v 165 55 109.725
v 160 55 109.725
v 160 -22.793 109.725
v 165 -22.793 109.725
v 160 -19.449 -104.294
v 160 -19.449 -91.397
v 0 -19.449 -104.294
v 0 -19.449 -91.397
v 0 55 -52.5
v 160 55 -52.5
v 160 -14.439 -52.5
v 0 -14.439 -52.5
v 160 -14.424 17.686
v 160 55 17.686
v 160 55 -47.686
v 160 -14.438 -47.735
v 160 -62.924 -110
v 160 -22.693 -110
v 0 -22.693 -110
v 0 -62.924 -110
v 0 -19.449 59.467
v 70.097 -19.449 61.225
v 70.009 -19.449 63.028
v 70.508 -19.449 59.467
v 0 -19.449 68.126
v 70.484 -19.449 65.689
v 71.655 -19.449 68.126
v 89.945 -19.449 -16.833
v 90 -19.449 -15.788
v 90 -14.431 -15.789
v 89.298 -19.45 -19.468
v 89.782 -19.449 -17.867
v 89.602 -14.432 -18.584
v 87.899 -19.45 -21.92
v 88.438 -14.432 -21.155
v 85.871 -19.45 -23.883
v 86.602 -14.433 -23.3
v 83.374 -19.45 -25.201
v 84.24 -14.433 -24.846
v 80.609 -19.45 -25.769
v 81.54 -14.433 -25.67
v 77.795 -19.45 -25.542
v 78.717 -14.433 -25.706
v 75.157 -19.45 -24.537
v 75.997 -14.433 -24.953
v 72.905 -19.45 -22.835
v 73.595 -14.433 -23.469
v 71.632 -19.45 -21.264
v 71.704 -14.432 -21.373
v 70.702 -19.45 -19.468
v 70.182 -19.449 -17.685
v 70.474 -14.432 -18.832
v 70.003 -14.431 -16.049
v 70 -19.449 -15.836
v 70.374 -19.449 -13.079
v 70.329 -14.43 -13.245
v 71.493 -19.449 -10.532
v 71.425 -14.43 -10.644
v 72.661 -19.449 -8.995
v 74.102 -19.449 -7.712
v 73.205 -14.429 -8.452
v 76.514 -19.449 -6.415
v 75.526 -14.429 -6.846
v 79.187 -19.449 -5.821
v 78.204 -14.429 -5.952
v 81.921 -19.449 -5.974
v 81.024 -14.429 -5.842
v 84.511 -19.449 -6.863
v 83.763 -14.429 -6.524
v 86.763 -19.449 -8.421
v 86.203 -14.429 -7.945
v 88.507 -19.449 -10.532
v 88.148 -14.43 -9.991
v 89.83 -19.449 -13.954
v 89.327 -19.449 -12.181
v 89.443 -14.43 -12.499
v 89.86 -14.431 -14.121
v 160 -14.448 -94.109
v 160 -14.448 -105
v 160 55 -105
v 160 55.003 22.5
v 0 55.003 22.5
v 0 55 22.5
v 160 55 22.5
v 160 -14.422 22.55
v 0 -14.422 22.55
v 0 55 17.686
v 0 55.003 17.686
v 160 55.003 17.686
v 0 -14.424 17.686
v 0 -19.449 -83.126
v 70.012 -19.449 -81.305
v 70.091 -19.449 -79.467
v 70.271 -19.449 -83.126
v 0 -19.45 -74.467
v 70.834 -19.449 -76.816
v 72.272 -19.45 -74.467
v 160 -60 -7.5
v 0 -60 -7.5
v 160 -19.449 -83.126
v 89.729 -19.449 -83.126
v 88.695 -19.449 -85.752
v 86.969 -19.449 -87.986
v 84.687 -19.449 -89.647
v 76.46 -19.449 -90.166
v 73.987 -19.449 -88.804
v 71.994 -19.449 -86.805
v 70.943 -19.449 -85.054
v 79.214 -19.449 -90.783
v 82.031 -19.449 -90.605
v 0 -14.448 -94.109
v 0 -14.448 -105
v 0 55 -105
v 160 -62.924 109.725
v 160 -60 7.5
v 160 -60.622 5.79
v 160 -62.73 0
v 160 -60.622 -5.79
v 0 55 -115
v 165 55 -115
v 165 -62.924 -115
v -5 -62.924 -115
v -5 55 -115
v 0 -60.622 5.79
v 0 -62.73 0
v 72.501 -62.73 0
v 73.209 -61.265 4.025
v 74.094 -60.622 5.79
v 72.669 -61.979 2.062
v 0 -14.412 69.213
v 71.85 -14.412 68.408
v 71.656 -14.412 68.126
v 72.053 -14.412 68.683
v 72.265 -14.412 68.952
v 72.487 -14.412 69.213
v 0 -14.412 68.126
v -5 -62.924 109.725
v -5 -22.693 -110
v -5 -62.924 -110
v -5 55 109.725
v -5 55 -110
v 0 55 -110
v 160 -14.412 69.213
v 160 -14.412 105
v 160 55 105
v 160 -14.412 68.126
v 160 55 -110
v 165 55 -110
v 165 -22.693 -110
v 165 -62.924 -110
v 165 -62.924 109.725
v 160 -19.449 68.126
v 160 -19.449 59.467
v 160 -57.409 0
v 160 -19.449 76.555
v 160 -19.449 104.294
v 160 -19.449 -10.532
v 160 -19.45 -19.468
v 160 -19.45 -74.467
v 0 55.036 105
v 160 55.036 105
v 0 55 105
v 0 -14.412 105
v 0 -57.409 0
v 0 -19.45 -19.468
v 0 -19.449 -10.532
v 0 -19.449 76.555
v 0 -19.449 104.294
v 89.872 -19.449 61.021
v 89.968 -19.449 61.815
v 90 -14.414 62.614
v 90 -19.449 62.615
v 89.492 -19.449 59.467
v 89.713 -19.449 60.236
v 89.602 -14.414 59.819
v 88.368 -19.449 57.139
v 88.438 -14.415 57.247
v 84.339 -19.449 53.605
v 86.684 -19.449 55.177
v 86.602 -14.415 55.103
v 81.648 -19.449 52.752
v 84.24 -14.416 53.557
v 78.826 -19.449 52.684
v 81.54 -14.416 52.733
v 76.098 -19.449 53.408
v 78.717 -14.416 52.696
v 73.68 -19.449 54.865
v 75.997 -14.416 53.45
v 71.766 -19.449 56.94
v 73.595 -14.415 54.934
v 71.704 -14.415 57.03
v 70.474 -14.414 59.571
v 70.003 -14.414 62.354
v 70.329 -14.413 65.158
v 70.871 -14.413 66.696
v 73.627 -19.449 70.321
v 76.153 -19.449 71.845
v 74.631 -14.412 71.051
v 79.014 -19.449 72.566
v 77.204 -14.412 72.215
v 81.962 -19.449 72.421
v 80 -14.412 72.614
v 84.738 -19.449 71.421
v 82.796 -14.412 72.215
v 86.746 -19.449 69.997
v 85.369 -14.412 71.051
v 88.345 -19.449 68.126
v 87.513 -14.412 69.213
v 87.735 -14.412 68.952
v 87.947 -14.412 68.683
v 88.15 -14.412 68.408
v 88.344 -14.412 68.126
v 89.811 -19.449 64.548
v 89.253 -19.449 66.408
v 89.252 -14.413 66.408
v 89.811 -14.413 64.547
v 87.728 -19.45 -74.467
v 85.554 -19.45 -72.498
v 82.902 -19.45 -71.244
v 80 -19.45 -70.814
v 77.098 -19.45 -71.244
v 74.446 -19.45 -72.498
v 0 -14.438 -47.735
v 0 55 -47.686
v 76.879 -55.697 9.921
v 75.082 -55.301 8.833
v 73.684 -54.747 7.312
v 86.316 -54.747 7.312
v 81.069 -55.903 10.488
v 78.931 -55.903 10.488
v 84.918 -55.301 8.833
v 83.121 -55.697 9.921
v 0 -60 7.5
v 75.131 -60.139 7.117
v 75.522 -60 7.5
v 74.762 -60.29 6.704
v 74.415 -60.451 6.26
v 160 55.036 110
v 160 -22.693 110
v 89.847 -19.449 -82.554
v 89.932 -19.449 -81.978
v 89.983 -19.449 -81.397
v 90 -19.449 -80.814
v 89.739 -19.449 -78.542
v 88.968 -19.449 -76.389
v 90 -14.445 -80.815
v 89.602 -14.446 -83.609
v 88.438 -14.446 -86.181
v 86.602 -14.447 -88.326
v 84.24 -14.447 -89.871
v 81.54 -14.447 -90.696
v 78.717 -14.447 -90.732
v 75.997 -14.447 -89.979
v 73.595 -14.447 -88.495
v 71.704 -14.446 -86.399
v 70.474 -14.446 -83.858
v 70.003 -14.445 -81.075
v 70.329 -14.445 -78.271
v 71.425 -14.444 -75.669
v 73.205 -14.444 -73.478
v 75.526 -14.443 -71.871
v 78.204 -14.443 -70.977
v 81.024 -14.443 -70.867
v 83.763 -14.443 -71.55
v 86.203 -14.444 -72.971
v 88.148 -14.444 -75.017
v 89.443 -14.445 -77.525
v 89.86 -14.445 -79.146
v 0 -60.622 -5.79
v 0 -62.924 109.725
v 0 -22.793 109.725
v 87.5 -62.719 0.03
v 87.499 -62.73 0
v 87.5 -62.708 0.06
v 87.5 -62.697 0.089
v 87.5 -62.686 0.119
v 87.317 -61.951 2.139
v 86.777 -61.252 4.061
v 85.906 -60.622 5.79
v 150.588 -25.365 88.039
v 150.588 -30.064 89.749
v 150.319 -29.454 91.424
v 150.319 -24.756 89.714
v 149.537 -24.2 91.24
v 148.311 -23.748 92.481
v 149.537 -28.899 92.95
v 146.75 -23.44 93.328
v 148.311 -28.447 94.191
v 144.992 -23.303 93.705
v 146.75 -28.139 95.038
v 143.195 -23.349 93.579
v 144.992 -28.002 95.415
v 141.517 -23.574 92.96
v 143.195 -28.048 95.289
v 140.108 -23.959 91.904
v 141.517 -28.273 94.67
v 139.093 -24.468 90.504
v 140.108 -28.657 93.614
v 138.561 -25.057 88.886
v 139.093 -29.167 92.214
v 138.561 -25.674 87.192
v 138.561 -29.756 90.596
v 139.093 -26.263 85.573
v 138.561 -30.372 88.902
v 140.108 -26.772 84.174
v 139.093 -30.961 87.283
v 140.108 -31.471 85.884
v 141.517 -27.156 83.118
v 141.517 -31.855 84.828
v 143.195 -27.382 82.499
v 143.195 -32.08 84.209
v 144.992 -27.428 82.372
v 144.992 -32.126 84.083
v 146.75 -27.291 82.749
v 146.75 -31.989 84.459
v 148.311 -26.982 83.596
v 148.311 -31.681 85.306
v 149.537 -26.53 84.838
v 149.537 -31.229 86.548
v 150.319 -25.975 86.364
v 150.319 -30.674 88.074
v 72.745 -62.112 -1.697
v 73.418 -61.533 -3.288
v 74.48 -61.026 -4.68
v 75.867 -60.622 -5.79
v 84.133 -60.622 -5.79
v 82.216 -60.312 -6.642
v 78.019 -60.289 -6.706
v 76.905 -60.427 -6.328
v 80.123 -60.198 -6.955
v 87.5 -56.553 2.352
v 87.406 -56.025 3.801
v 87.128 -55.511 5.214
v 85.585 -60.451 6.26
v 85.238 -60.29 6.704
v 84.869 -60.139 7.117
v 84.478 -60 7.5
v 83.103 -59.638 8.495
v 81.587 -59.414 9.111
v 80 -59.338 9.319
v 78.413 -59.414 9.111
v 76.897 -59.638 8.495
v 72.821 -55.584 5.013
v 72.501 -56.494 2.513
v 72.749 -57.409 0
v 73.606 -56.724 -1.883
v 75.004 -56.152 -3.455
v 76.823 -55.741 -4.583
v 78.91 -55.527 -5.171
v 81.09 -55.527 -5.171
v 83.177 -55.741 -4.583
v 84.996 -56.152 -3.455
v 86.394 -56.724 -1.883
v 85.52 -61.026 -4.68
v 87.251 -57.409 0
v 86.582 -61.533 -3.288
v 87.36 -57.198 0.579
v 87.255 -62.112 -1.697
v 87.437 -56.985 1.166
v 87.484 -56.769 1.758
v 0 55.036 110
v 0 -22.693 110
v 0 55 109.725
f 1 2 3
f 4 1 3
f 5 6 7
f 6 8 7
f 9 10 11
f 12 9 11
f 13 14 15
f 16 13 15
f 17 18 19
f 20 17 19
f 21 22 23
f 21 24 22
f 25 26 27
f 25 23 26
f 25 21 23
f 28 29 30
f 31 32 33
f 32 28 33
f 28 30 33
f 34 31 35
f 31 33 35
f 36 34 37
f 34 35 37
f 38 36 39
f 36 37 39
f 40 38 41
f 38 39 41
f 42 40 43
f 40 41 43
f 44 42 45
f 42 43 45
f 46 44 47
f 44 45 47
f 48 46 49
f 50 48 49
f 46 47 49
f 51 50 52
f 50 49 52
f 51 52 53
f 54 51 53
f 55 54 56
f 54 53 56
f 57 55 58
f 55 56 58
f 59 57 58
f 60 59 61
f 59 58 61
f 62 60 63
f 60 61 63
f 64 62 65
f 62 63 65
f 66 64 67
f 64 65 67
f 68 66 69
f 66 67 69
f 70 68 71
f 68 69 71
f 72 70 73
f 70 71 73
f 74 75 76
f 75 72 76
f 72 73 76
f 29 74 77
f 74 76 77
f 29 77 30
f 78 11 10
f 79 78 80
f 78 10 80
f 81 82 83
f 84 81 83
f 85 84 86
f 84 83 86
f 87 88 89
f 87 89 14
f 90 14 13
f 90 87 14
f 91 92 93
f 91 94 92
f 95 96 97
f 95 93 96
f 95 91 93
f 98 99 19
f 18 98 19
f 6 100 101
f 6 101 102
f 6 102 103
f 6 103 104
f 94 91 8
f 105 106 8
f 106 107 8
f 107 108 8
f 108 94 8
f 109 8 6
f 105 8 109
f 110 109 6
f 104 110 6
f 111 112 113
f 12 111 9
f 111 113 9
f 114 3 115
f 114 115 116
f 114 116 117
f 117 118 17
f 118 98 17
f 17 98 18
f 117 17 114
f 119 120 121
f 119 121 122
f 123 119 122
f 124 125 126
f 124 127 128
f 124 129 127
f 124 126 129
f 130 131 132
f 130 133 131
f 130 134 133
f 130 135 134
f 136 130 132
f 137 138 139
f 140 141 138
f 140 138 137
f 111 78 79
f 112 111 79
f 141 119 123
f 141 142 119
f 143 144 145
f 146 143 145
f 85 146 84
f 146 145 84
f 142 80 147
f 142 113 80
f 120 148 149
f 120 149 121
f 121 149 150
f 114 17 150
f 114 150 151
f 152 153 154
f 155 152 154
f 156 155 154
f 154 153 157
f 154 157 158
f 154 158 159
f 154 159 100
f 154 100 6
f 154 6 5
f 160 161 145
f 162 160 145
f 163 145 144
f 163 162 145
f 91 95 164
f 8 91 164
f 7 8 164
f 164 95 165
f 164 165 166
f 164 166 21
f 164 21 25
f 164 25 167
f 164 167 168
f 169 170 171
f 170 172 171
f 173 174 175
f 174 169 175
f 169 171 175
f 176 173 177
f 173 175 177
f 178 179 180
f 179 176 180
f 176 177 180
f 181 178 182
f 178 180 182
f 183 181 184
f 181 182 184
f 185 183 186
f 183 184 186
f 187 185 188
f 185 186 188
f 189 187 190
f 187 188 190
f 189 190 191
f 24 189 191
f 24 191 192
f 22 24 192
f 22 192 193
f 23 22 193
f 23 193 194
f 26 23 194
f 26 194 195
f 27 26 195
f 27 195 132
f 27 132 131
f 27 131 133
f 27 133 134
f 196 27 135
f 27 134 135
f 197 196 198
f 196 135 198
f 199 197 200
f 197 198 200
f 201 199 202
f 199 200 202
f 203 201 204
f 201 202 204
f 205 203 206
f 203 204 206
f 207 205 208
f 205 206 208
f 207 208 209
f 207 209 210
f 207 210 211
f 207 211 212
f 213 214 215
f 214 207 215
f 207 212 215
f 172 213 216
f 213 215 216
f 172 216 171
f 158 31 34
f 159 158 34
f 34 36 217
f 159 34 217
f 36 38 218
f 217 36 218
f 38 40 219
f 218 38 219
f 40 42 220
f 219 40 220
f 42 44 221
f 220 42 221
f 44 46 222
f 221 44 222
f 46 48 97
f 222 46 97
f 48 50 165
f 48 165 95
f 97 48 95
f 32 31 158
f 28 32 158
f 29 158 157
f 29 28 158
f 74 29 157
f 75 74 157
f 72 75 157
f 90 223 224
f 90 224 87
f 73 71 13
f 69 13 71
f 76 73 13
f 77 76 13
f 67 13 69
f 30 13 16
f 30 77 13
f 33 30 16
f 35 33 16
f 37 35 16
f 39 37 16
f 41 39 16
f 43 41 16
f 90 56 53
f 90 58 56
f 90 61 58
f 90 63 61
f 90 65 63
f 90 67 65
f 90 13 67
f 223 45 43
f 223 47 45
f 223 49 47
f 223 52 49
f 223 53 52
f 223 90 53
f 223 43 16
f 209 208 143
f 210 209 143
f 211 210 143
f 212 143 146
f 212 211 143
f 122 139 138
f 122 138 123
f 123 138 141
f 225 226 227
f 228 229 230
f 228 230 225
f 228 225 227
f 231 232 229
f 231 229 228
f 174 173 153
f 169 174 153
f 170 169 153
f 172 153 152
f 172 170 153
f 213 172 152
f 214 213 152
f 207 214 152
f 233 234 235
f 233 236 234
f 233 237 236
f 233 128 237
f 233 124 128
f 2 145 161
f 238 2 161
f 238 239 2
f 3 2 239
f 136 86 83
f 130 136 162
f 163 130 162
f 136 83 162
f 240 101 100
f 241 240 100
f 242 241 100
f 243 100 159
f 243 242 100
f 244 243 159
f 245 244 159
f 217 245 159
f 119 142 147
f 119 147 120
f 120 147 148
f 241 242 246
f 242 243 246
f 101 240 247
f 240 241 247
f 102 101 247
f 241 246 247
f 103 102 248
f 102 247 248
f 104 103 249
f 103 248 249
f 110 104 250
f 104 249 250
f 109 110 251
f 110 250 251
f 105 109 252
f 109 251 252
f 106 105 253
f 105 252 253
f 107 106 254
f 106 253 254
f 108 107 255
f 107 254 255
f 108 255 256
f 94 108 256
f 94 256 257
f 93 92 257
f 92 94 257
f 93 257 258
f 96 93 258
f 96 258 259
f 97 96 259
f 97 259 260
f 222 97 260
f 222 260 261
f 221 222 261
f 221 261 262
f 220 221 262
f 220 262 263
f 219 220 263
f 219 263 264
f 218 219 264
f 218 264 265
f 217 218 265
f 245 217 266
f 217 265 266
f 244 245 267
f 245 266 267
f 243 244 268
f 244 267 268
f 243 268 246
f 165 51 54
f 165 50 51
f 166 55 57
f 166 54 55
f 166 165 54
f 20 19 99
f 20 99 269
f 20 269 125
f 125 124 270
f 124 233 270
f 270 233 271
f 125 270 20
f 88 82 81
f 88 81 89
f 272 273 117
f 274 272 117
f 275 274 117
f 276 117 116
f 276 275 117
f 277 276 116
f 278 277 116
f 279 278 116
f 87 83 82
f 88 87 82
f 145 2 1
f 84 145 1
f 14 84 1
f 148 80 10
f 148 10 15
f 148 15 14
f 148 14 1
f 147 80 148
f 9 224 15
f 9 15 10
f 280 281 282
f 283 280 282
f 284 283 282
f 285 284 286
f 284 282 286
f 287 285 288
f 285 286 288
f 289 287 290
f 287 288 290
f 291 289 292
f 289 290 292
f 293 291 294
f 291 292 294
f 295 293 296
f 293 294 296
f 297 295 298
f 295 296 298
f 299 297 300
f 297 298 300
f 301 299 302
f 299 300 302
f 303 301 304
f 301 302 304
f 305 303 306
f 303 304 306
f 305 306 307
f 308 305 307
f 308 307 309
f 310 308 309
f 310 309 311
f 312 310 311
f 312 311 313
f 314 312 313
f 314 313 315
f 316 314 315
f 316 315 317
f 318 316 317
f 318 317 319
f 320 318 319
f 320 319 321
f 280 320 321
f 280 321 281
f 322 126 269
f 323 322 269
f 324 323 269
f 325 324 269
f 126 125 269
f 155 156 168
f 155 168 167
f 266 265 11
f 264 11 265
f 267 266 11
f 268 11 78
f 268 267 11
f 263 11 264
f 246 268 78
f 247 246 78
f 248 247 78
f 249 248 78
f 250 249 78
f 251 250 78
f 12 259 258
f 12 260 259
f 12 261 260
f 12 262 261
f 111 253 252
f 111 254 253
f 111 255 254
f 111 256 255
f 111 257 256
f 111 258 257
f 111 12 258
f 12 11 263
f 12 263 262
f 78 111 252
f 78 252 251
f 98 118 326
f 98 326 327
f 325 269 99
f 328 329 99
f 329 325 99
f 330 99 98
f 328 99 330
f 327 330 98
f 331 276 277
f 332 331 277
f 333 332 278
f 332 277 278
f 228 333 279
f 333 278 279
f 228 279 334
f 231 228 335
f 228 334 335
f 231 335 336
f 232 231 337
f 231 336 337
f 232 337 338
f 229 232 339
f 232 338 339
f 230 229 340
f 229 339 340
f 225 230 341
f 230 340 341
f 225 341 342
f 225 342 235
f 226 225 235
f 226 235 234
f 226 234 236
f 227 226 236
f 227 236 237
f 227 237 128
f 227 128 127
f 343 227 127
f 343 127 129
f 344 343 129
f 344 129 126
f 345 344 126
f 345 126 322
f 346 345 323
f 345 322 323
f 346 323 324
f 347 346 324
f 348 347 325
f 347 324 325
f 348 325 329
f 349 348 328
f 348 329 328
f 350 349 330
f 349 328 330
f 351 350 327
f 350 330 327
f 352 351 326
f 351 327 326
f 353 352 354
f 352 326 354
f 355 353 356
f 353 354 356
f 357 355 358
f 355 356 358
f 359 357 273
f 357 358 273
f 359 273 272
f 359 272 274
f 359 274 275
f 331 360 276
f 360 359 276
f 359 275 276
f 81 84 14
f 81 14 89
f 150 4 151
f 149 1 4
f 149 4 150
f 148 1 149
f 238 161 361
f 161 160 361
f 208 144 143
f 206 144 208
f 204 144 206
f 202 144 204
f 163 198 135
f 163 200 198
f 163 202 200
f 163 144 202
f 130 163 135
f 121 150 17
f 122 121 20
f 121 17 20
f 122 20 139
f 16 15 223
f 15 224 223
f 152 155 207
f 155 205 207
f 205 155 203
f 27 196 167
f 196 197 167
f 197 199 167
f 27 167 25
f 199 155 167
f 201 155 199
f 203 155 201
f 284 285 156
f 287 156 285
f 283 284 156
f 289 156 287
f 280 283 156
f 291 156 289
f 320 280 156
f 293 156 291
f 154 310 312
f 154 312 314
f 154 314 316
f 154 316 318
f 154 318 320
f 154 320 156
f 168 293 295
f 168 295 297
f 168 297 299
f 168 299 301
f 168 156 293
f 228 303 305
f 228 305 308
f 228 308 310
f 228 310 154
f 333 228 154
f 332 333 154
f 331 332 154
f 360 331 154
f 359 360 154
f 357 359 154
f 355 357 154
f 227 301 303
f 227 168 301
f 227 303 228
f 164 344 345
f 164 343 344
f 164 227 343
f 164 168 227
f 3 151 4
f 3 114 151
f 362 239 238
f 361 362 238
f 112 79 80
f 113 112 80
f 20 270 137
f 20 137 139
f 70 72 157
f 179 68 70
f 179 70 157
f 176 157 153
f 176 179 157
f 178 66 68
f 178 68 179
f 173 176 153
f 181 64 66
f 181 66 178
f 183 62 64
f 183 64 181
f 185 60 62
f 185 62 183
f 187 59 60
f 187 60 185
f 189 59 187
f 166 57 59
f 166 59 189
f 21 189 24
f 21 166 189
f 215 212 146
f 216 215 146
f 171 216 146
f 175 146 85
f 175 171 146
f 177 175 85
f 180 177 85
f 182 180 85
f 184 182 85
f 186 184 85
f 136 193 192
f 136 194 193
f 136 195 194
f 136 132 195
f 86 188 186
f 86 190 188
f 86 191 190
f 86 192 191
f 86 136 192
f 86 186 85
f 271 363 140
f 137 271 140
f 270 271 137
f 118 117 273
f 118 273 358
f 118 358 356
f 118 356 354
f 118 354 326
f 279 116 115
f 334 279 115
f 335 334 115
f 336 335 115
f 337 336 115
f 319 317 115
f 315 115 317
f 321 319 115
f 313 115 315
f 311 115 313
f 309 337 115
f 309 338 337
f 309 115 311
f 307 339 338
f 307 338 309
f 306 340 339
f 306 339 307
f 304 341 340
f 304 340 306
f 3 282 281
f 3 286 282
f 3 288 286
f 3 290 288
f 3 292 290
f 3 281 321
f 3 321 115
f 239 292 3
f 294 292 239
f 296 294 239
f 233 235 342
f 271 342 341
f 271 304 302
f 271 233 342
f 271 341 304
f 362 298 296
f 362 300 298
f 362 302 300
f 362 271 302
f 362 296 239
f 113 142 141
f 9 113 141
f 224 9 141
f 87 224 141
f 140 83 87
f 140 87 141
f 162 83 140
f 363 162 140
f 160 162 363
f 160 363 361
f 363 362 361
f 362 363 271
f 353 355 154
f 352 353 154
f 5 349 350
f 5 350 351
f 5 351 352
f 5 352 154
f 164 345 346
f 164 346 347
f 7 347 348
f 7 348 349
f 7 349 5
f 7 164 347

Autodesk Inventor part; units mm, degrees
ref_plane "YZ Plane" through (0, 0, 0) normal (1, 0, 0) x (0, 1, 0)
ref_plane "XZ Plane" through (0, 0, 0) normal (0, 1, 0) x (-1, 0, 0)
ref_plane "XY Plane" through (0, 0, 0) normal (0, 0, 1) x (1, 0, 0)
sketch "Sketch1" plane through (0, 0, 0) normal (1, 0, 0) x (0, 1, 0)
  line L0 (-22.6931, 110) -> (55.0359, 110)
  line L1 (55, -110) -> (-22.6931, -110)
  line L2 (-62.7298, 0) -> (-22.6931, -110)
  line L3 (-62.7298, 0) -> (-22.6931, 110)
  line L4 (-57.4089, 0) -> (-19.449, -104.2938)
  line L5 (-14.4482, -105) -> (55, -105)
  line L6 (55.0359, 105) -> (-14.4122, 105)
  line L7 (-19.449, 104.2938) -> (-57.4089, 0)
  line L8 (55.0034, 17.6855) -> (-14.4593, 17.6855)
  line L9 (55.0034, 22.5) -> (-14.4456, 22.5496)
  line L10 (55, -52.5) -> (-14.449, -52.5)
  line L11 (55, -47.6855) -> (-14.449, -47.7352)
  line L12 (-60.6224, -5.7899) -> (-60, -7.5)
  line L13 (-60.6224, 5.7899) -> (-60, 7.5)
  line L14 (-14.4122, 105) -> (-14.4122, 68.1255)
  line L15 (-14.4456, 59.4672) -> (-14.4456, 22.5496)
  line L16 (-19.449, 104.2938) -> (-19.449, 68.1255)
  line L17 (-14.4593, 17.6855) -> (-14.4593, -10.5317)
  line L18 (-14.449, -19.4683) -> (-14.449, -47.7352)
  line L19 (-19.4705, 59.4672) -> (-19.4705, -10.5317)
  line L20 (-14.449, -52.5) -> (-14.449, -74.4672)
  line L21 (-14.4482, -83.1255) -> (-14.4482, -105.0928)
  line L22 (-19.4499, -19.4683) -> (-19.4499, -74.4672)
  line L23 (-19.449, -83.1255) -> (-19.449, -104.2938)
  line L24 (-19.449, -74.4672) -> (-19.4499, -74.4672)
  line L25 (-14.4593, -83.1255) -> (-14.4482, -83.1255)
  line L26 (-19.4499, -19.4683) -> (-19.449, -19.4683)
  line L27 (-19.4705, -10.5317) -> (-19.449, -10.5317)
  line L28 (-14.4122, 68.1255) -> (-14.4125, 68.1255)
  line L29 (-19.4705, 59.4672) -> (-19.449, 59.4672)
  line L30 (55.0359, 105) -> (55.0359, 110)
  line L31 (55.0034, 22.5) -> (55.0034, 17.6855)
  line L32 (55, -47.6855) -> (55, -52.5)
  line L33 (55, -105) -> (55, -110)
  line L34 (-19.449, -91.3967) -> (-19.449, 76.5553)
  line L35 (-14.4122, 69.213) -> (-14.4225, 22.5496)
  line L36 (-14.4236, 17.6855) -> (-14.438, -47.7351)
  line L37 (-14.439, -52.5) -> (-14.4482, -94.1091)
  point P0 (0, 0)
extrude "Extrusion1" add sketch "Sketch1" along normal blind 160
sketch "Sketch2" plane through (0, -14.4236, 17.6855) normal (0, 1, -0.0002) x (1, 0, 0)
  circle A0 centre (80, 33.4744) radius 10
  circle A1 centre (80, 98.5003) radius 10
  circle A2 centre (80, -44.9284) radius 10
  point P0 (0, 17.6824)
  dimension "d24" = 20
  dimension "d25" = 20
  dimension "d26" = 20
extrude "Extrusion2" cut sketch "Sketch2" against normal blind 6
sketch "Sketch3" plane through (0, -22.6931, -110) normal (0, -0.9397, -0.342) x (1, 0, 0)
  point P0 (0, 95.6047)
sketch "Sketch4" plane through (0, -22.6931, -110) normal (0, -0.9397, -0.342) x (1, 0, 0)
  line L0 (0, 117.1568) -> (160, 117.1568) projected
  circle A0 centre (80, 117.1568) radius 7.5
  point P0 (0, 95.6047)
  dimension "d29" = 15
extrude "Extrusion3" cut sketch "Sketch4" against normal blind 10
sketch "Sketch5" plane through (0, 0, 0) normal (-1, 0, 0) x (0, 0, 1)
  line L0 (-110, -22.6931) -> (-110, 55) projected
  line L1 (-110, 55) -> (109.7253, 55)
  line L2 (109.7253, 55) -> (109.7253, -62.9244)
  line L3 (109.7253, -62.9244) -> (-110, -62.9244)
  line L4 (-110, -62.9244) -> (-110, 55)
  point P0 (0, 0)
extrude "Extrusion4" add sketch "Sketch5" along normal blind 5
sketch "Sketch6" plane through (160, 0, 0) normal (1, 0, 0) x (0, 0, -1)
  line L0 (-109.7253, 55) -> (-109.7253, -22.793) projected
  line L1 (110, -22.6931) -> (110, -62.9244) projected
  line L2 (-109.7253, 55) -> (110, 55)
  line L3 (110, 55) -> (110, -62.9244)
  line L4 (110, -62.9244) -> (-109.7253, -62.9244)
  line L5 (-109.7253, -62.9244) -> (-109.7253, 55)
  point P0 (0, 0)
extrude "Extrusion5" add sketch "Sketch6" along normal blind 5
sketch "Sketch7" plane through (0, -62.9244, 109.7253) normal (0, 0, 1) x (1, 0, 0)
  line L0 (-5, 117.9244) -> (165, 117.9244) projected
  line L1 (-5, 117.9244) -> (165, 117.9244)
  line L2 (165, 117.9244) -> (165, 0)
  line L3 (165, 0) -> (-5, 0)
  line L4 (-5, 0) -> (-5, 117.9244)
  line L5 (165, 0) -> (-5, 0)
  line L6 (-5, 0) -> (-5, 117.9244)
  line L7 (-5, 117.9244) -> (165, 117.9244)
  line L8 (165, 117.9244) -> (165, 0)
  point P0 (0, 62.9244)
sketch "Sketch8" plane through (0, -22.6931, 110) normal (0, -0.9397, 0.342) x (1, 0, 0)
  circle A0 centre (144.5406, -21.5508) radius 6.0469
  point P0 (0, -95.6047)
extrude "Extrusion6" cut sketch "Sketch8" against normal blind 6
sketch "Sketch9" plane through (0, -62.9244, -110) normal (0, 0, -1) x (-1, 0, 0)
  line L0 (-165, 117.9244) -> (-165, 0) projected
  line L1 (0, 117.9244) -> (5, 117.9244) projected
  line L2 (-165, 0) -> (5, 0)
  line L3 (5, 0) -> (5, 117.9244)
  line L4 (5, 117.9244) -> (-165, 117.9244)
  line L5 (-165, 117.9244) -> (-165, 0)
  point P0 (0, 62.9244)
extrude "Extrusion7" add sketch "Sketch9" along normal blind 5
properties part number "Storage Tank"
